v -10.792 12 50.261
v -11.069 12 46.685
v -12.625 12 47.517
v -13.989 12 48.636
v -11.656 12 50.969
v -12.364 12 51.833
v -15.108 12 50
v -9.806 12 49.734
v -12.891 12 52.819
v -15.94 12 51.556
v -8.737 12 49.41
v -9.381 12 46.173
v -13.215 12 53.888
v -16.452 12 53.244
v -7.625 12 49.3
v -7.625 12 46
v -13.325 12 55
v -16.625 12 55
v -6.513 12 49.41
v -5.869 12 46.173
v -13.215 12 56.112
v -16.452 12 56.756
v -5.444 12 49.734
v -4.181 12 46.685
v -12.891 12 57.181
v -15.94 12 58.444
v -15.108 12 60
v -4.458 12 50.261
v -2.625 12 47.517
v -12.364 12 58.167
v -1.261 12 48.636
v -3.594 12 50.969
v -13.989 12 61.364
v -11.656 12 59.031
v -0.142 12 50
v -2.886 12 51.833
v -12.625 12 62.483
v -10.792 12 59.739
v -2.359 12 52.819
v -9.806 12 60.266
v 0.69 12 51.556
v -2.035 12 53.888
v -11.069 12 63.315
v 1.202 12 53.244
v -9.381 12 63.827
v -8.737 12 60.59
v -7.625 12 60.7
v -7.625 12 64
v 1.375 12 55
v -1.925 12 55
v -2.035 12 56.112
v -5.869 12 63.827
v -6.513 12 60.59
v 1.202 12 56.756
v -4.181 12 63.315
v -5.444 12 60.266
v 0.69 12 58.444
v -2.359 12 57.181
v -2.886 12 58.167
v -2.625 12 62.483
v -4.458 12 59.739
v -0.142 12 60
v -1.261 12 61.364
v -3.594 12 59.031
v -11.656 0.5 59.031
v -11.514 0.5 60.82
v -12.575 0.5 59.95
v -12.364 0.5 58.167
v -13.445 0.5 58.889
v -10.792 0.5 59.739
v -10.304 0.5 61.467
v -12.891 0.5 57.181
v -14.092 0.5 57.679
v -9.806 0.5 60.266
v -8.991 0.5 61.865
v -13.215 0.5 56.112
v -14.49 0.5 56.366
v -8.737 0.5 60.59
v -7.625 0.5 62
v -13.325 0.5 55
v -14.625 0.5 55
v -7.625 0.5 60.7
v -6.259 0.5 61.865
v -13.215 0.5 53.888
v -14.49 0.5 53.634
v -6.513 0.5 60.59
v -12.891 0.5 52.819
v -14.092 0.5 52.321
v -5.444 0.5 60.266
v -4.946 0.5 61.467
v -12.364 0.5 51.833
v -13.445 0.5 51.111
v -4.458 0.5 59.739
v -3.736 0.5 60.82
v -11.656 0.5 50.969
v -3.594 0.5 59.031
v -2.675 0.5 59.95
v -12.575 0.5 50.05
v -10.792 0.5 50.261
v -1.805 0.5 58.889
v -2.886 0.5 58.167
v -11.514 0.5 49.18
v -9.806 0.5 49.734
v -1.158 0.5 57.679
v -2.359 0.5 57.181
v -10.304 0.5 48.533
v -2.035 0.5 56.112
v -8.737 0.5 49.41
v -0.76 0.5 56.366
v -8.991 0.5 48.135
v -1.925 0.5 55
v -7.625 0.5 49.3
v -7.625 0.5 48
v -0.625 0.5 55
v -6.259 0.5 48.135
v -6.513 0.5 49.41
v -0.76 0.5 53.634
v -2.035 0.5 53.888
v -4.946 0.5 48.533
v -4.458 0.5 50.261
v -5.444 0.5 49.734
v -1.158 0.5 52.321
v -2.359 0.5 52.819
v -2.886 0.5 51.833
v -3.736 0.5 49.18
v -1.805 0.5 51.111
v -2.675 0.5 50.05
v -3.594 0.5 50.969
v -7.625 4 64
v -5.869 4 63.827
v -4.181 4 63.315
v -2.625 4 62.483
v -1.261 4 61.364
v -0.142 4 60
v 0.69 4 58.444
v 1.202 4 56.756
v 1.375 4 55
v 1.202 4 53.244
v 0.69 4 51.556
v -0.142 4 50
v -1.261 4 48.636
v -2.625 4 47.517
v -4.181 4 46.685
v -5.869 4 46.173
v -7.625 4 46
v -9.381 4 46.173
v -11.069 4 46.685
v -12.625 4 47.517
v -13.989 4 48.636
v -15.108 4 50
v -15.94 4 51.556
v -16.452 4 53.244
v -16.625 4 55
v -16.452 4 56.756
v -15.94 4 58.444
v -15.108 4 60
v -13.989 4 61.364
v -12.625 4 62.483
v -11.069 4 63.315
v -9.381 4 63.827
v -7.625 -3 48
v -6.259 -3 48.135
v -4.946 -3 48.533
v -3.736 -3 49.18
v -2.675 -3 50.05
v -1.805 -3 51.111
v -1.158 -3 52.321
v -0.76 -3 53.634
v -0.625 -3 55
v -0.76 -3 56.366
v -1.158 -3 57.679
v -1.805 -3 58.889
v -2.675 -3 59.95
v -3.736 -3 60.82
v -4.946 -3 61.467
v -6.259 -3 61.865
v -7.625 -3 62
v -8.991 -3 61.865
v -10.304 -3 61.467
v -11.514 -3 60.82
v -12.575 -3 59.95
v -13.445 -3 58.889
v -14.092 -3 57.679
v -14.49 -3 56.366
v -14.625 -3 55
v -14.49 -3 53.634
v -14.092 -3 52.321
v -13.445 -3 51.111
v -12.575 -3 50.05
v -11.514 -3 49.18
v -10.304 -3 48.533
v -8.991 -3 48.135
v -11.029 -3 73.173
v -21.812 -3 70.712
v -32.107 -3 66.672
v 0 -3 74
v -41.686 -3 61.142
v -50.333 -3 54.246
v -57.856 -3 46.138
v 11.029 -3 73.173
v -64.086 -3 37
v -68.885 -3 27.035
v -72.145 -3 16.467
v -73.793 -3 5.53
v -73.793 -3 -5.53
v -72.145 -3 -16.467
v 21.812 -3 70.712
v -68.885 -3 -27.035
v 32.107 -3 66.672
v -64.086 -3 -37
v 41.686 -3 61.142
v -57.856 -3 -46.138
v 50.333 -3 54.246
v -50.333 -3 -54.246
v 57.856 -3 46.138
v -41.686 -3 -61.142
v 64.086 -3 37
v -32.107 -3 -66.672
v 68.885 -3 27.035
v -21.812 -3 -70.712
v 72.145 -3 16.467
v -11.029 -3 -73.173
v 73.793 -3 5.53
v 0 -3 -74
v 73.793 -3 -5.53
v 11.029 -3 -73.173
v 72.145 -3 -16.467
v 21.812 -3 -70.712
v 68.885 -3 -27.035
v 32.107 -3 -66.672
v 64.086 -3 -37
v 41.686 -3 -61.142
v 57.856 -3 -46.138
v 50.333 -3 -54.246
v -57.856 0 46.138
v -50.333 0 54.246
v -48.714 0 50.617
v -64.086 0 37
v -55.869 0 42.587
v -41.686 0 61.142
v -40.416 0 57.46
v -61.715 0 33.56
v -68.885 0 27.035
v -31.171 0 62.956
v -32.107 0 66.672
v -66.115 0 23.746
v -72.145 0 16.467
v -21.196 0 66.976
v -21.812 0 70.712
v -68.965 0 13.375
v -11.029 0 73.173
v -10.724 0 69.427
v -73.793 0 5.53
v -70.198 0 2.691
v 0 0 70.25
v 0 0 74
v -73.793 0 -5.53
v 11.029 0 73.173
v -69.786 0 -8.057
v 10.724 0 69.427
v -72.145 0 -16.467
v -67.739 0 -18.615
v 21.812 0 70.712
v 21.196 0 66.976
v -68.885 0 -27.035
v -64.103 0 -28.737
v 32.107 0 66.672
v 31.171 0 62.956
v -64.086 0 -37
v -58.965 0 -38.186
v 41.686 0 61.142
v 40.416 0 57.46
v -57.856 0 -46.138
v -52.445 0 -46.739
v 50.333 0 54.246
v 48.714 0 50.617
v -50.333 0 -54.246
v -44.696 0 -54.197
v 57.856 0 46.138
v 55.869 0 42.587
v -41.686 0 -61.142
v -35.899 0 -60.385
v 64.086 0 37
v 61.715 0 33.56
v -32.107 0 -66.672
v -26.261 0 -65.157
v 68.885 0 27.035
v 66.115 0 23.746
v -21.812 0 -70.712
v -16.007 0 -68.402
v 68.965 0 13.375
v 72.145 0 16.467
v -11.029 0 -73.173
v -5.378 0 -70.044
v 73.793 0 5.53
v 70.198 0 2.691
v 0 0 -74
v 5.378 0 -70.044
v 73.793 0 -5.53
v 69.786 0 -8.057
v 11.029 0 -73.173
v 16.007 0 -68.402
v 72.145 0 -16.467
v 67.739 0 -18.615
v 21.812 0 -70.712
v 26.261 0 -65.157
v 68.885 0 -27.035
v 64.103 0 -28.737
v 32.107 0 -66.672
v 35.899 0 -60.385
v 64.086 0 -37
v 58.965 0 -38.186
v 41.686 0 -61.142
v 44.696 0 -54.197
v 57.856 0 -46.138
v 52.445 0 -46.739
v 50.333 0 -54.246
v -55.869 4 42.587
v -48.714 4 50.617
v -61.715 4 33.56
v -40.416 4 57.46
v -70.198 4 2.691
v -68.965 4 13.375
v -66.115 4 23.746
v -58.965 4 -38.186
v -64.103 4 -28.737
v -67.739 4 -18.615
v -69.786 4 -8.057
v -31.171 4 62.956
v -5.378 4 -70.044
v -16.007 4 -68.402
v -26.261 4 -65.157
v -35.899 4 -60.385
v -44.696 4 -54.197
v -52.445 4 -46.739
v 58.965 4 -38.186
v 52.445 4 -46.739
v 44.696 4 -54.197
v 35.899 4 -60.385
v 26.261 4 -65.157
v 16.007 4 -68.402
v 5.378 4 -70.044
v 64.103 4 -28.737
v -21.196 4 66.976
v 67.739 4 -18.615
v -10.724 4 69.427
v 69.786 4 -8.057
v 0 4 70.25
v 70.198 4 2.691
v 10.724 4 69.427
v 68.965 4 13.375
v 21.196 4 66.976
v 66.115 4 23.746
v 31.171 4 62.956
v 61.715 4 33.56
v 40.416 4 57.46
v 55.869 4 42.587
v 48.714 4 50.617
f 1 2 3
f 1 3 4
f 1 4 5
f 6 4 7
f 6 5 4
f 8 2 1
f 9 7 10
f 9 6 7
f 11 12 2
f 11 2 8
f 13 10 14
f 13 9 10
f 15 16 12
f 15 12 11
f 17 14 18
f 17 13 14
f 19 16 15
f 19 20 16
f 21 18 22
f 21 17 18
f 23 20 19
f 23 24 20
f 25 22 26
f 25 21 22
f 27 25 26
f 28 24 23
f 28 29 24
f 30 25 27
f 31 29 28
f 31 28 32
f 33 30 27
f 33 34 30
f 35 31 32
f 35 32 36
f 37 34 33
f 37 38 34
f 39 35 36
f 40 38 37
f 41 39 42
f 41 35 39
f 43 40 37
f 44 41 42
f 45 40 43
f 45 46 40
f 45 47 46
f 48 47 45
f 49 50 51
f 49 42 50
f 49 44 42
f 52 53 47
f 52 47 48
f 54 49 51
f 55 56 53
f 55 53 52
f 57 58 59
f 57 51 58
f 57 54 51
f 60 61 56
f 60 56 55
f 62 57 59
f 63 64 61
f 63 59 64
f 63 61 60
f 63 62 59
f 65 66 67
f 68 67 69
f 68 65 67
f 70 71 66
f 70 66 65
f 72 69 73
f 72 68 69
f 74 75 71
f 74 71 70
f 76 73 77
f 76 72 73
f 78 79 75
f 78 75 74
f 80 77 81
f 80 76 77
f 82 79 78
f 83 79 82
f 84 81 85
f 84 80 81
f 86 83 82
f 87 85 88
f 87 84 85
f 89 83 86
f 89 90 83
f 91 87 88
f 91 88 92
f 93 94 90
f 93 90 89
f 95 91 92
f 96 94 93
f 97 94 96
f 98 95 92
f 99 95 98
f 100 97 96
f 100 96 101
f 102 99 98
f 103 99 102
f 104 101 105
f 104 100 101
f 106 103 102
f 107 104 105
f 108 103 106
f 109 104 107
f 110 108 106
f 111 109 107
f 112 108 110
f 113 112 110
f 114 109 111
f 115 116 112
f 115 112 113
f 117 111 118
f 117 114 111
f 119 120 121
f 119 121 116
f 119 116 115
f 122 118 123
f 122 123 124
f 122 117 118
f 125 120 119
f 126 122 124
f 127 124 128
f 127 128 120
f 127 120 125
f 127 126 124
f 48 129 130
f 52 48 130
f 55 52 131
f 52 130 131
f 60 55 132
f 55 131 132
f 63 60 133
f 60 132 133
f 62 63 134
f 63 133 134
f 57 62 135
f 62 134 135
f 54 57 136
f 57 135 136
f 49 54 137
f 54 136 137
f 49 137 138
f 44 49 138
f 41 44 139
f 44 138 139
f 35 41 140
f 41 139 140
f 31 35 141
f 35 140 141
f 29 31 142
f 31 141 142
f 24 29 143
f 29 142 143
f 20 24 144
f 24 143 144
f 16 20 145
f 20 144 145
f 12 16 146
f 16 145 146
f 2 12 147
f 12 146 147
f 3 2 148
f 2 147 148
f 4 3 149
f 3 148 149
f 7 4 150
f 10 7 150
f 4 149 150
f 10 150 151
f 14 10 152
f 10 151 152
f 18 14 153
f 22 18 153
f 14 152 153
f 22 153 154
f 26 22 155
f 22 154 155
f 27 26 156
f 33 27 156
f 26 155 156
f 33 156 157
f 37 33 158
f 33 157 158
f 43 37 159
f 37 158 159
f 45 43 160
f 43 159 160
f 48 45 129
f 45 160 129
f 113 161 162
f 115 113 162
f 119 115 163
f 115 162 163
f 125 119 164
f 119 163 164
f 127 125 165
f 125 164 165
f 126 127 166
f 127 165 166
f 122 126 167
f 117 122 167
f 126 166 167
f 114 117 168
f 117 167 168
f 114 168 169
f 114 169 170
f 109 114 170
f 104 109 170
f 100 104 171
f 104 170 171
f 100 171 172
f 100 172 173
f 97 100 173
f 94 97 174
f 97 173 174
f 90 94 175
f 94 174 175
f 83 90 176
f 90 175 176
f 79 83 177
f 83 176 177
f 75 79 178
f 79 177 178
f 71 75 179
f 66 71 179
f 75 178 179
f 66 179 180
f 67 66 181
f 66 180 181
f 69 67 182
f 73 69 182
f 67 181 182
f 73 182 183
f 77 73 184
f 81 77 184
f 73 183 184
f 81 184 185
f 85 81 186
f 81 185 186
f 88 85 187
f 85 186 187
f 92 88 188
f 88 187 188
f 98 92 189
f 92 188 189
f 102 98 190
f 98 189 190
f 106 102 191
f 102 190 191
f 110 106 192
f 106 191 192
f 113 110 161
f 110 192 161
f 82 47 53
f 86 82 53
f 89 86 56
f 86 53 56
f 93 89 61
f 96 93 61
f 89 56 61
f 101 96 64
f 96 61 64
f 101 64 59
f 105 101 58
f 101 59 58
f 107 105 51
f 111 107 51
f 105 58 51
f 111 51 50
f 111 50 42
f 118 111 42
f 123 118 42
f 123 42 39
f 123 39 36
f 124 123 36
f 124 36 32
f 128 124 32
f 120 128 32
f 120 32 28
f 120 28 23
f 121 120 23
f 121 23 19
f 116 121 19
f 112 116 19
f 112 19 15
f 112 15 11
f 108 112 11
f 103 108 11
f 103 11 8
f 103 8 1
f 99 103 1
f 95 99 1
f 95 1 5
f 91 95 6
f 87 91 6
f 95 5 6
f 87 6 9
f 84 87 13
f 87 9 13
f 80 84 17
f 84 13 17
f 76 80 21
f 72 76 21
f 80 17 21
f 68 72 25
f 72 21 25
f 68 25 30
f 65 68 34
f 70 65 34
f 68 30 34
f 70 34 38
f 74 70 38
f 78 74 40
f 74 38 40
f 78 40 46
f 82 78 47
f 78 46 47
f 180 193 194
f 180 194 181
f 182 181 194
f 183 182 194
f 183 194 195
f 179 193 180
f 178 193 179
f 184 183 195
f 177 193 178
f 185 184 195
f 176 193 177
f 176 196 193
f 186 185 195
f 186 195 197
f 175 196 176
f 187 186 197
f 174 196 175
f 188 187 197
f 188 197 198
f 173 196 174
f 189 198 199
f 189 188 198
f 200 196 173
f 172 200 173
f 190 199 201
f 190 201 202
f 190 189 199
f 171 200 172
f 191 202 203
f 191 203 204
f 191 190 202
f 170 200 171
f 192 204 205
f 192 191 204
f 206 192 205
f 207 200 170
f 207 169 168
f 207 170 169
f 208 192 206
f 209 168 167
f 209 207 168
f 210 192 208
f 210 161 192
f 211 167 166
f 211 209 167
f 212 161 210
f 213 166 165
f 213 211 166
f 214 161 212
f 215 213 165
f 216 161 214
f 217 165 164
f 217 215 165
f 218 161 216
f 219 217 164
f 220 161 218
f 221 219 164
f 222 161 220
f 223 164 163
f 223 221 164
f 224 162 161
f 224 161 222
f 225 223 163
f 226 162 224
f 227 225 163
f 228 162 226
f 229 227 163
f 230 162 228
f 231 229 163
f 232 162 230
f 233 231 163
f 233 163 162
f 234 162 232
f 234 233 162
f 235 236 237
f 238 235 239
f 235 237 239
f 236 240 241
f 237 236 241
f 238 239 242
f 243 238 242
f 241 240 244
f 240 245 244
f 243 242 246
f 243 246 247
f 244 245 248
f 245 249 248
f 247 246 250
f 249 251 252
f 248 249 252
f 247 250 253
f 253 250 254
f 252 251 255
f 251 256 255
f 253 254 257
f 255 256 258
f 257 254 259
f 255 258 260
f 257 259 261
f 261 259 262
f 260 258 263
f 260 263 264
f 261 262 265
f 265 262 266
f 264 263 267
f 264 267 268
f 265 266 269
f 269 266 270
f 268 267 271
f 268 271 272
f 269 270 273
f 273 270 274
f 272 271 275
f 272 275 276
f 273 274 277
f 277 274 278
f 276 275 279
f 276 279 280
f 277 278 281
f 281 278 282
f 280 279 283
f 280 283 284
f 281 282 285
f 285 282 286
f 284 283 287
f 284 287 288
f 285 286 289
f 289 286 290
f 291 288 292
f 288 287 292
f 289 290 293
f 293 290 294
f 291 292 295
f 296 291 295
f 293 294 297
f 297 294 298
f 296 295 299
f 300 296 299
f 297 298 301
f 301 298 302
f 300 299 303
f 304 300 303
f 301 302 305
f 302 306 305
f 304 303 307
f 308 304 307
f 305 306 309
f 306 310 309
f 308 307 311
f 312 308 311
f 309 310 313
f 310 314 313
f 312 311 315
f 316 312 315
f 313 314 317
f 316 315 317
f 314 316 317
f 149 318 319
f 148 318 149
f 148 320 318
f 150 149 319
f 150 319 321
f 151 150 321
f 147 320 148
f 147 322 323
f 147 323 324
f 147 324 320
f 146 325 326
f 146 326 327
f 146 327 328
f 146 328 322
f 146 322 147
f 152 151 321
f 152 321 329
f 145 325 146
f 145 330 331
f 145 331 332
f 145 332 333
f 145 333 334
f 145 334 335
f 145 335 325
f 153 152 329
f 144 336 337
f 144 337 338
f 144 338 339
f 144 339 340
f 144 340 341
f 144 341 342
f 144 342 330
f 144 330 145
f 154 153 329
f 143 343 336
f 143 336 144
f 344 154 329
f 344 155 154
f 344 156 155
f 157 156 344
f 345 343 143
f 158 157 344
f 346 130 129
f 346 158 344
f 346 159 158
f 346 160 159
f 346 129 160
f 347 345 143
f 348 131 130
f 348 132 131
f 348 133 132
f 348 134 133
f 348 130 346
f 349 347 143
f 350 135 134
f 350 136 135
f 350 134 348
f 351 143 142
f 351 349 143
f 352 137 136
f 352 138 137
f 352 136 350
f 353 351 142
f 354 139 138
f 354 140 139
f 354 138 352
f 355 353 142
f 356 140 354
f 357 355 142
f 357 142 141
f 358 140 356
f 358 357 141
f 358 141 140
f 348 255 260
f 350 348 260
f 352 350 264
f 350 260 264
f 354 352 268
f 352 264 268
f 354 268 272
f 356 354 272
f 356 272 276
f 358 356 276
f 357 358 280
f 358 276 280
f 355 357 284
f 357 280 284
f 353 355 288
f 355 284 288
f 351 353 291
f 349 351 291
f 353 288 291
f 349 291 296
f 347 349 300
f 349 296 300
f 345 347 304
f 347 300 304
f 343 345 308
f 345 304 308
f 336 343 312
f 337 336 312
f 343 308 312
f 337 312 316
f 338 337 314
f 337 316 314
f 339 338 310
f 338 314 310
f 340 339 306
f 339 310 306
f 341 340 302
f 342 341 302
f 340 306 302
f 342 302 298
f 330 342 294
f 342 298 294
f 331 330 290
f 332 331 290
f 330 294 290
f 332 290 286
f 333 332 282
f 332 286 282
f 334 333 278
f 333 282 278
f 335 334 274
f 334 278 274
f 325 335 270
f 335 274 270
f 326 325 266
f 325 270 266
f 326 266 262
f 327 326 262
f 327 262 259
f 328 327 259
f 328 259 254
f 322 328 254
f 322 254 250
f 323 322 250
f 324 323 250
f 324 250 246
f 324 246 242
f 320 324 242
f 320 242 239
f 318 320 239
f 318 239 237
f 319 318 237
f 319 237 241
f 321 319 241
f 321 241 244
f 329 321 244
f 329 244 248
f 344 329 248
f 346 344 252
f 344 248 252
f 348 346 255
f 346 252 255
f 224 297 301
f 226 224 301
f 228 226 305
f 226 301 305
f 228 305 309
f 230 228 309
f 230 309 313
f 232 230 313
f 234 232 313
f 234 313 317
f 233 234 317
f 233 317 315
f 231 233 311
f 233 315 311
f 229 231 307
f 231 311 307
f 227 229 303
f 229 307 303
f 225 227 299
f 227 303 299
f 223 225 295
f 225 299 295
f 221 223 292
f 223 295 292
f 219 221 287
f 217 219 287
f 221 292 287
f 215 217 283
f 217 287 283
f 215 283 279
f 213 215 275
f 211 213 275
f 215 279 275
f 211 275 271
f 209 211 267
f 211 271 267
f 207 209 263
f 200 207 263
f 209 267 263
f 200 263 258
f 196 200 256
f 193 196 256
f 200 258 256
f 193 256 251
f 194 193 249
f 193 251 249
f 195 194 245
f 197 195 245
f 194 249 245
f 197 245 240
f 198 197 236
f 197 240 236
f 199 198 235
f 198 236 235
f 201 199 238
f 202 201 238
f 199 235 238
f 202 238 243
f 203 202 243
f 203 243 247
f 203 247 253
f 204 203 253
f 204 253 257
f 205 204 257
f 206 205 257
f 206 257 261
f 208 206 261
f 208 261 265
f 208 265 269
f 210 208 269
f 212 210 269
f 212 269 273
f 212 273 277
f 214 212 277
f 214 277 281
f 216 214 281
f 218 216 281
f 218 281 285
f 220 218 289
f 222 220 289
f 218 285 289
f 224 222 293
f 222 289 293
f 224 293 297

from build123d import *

# Parameters (mm, degrees)
SKETCH1_R           = 70.25
BOSS_EXTRUDE1_DEPTH = 4
SKETCH3_R           = 74
BOSS_EXTRUDE2_DEPTH = 3
SKETCH2_R           = 9
BOSS_EXTRUDE3_DEPTH = 8
SKETCH6_R           = 7
CUT_EXTRUDE2_DEPTH  = 3.5
SKETCH4_R           = 5.7
CUT_EXTRUDE3_DEPTH  = 106.721331812


with BuildPart() as part:
    # Sketch1 → Boss-Extrude1 (new body)
    with BuildSketch(Plane(origin=(0, 0, 0), x_dir=(1, 0, 0), z_dir=(0, 1, 0))):
        with Locations(Location((0, 0, 0), (0, 0, 270))):
            Circle(SKETCH1_R)
    extrude(amount=BOSS_EXTRUDE1_DEPTH)

    # Sketch3 → Boss-Extrude2 (add)
    with BuildSketch(Plane.XZ):
        with Locations(Location((0, 0, 0), (0, 0, 270))):
            Circle(SKETCH3_R)
    extrude(amount=BOSS_EXTRUDE2_DEPTH)

    # Sketch2 → Boss-Extrude3 (add)
    with BuildSketch(Plane(origin=(0, 4, 0), x_dir=(1, 0, 0), z_dir=(0, 1, 0))):
        with Locations(Location((-7.625001084, -55, 0), (0, 0, 270))):
            Circle(SKETCH2_R)
    extrude(amount=BOSS_EXTRUDE3_DEPTH)

    # Sketch6 → Cut-Extrude2 (cut)
    with BuildSketch(Plane.XZ.offset(3)):
        with Locations(Location((-7.625001084, 55, 0), (0, 0, 270))):
            Circle(SKETCH6_R)
    extrude(amount=-CUT_EXTRUDE2_DEPTH, mode=Mode.SUBTRACT)

    # Sketch4 → Cut-Extrude3 (cut, through all)
    with BuildSketch(Plane(origin=(0, 12, 0), x_dir=(1, 0, 0), z_dir=(0, 1, 0))):
        with Locations(Location((-7.625001084, -55, 0), (0, 0, 270))):
            Circle(SKETCH4_R)
    extrude(amount=-CUT_EXTRUDE3_DEPTH, mode=Mode.SUBTRACT)


solid = part.part
